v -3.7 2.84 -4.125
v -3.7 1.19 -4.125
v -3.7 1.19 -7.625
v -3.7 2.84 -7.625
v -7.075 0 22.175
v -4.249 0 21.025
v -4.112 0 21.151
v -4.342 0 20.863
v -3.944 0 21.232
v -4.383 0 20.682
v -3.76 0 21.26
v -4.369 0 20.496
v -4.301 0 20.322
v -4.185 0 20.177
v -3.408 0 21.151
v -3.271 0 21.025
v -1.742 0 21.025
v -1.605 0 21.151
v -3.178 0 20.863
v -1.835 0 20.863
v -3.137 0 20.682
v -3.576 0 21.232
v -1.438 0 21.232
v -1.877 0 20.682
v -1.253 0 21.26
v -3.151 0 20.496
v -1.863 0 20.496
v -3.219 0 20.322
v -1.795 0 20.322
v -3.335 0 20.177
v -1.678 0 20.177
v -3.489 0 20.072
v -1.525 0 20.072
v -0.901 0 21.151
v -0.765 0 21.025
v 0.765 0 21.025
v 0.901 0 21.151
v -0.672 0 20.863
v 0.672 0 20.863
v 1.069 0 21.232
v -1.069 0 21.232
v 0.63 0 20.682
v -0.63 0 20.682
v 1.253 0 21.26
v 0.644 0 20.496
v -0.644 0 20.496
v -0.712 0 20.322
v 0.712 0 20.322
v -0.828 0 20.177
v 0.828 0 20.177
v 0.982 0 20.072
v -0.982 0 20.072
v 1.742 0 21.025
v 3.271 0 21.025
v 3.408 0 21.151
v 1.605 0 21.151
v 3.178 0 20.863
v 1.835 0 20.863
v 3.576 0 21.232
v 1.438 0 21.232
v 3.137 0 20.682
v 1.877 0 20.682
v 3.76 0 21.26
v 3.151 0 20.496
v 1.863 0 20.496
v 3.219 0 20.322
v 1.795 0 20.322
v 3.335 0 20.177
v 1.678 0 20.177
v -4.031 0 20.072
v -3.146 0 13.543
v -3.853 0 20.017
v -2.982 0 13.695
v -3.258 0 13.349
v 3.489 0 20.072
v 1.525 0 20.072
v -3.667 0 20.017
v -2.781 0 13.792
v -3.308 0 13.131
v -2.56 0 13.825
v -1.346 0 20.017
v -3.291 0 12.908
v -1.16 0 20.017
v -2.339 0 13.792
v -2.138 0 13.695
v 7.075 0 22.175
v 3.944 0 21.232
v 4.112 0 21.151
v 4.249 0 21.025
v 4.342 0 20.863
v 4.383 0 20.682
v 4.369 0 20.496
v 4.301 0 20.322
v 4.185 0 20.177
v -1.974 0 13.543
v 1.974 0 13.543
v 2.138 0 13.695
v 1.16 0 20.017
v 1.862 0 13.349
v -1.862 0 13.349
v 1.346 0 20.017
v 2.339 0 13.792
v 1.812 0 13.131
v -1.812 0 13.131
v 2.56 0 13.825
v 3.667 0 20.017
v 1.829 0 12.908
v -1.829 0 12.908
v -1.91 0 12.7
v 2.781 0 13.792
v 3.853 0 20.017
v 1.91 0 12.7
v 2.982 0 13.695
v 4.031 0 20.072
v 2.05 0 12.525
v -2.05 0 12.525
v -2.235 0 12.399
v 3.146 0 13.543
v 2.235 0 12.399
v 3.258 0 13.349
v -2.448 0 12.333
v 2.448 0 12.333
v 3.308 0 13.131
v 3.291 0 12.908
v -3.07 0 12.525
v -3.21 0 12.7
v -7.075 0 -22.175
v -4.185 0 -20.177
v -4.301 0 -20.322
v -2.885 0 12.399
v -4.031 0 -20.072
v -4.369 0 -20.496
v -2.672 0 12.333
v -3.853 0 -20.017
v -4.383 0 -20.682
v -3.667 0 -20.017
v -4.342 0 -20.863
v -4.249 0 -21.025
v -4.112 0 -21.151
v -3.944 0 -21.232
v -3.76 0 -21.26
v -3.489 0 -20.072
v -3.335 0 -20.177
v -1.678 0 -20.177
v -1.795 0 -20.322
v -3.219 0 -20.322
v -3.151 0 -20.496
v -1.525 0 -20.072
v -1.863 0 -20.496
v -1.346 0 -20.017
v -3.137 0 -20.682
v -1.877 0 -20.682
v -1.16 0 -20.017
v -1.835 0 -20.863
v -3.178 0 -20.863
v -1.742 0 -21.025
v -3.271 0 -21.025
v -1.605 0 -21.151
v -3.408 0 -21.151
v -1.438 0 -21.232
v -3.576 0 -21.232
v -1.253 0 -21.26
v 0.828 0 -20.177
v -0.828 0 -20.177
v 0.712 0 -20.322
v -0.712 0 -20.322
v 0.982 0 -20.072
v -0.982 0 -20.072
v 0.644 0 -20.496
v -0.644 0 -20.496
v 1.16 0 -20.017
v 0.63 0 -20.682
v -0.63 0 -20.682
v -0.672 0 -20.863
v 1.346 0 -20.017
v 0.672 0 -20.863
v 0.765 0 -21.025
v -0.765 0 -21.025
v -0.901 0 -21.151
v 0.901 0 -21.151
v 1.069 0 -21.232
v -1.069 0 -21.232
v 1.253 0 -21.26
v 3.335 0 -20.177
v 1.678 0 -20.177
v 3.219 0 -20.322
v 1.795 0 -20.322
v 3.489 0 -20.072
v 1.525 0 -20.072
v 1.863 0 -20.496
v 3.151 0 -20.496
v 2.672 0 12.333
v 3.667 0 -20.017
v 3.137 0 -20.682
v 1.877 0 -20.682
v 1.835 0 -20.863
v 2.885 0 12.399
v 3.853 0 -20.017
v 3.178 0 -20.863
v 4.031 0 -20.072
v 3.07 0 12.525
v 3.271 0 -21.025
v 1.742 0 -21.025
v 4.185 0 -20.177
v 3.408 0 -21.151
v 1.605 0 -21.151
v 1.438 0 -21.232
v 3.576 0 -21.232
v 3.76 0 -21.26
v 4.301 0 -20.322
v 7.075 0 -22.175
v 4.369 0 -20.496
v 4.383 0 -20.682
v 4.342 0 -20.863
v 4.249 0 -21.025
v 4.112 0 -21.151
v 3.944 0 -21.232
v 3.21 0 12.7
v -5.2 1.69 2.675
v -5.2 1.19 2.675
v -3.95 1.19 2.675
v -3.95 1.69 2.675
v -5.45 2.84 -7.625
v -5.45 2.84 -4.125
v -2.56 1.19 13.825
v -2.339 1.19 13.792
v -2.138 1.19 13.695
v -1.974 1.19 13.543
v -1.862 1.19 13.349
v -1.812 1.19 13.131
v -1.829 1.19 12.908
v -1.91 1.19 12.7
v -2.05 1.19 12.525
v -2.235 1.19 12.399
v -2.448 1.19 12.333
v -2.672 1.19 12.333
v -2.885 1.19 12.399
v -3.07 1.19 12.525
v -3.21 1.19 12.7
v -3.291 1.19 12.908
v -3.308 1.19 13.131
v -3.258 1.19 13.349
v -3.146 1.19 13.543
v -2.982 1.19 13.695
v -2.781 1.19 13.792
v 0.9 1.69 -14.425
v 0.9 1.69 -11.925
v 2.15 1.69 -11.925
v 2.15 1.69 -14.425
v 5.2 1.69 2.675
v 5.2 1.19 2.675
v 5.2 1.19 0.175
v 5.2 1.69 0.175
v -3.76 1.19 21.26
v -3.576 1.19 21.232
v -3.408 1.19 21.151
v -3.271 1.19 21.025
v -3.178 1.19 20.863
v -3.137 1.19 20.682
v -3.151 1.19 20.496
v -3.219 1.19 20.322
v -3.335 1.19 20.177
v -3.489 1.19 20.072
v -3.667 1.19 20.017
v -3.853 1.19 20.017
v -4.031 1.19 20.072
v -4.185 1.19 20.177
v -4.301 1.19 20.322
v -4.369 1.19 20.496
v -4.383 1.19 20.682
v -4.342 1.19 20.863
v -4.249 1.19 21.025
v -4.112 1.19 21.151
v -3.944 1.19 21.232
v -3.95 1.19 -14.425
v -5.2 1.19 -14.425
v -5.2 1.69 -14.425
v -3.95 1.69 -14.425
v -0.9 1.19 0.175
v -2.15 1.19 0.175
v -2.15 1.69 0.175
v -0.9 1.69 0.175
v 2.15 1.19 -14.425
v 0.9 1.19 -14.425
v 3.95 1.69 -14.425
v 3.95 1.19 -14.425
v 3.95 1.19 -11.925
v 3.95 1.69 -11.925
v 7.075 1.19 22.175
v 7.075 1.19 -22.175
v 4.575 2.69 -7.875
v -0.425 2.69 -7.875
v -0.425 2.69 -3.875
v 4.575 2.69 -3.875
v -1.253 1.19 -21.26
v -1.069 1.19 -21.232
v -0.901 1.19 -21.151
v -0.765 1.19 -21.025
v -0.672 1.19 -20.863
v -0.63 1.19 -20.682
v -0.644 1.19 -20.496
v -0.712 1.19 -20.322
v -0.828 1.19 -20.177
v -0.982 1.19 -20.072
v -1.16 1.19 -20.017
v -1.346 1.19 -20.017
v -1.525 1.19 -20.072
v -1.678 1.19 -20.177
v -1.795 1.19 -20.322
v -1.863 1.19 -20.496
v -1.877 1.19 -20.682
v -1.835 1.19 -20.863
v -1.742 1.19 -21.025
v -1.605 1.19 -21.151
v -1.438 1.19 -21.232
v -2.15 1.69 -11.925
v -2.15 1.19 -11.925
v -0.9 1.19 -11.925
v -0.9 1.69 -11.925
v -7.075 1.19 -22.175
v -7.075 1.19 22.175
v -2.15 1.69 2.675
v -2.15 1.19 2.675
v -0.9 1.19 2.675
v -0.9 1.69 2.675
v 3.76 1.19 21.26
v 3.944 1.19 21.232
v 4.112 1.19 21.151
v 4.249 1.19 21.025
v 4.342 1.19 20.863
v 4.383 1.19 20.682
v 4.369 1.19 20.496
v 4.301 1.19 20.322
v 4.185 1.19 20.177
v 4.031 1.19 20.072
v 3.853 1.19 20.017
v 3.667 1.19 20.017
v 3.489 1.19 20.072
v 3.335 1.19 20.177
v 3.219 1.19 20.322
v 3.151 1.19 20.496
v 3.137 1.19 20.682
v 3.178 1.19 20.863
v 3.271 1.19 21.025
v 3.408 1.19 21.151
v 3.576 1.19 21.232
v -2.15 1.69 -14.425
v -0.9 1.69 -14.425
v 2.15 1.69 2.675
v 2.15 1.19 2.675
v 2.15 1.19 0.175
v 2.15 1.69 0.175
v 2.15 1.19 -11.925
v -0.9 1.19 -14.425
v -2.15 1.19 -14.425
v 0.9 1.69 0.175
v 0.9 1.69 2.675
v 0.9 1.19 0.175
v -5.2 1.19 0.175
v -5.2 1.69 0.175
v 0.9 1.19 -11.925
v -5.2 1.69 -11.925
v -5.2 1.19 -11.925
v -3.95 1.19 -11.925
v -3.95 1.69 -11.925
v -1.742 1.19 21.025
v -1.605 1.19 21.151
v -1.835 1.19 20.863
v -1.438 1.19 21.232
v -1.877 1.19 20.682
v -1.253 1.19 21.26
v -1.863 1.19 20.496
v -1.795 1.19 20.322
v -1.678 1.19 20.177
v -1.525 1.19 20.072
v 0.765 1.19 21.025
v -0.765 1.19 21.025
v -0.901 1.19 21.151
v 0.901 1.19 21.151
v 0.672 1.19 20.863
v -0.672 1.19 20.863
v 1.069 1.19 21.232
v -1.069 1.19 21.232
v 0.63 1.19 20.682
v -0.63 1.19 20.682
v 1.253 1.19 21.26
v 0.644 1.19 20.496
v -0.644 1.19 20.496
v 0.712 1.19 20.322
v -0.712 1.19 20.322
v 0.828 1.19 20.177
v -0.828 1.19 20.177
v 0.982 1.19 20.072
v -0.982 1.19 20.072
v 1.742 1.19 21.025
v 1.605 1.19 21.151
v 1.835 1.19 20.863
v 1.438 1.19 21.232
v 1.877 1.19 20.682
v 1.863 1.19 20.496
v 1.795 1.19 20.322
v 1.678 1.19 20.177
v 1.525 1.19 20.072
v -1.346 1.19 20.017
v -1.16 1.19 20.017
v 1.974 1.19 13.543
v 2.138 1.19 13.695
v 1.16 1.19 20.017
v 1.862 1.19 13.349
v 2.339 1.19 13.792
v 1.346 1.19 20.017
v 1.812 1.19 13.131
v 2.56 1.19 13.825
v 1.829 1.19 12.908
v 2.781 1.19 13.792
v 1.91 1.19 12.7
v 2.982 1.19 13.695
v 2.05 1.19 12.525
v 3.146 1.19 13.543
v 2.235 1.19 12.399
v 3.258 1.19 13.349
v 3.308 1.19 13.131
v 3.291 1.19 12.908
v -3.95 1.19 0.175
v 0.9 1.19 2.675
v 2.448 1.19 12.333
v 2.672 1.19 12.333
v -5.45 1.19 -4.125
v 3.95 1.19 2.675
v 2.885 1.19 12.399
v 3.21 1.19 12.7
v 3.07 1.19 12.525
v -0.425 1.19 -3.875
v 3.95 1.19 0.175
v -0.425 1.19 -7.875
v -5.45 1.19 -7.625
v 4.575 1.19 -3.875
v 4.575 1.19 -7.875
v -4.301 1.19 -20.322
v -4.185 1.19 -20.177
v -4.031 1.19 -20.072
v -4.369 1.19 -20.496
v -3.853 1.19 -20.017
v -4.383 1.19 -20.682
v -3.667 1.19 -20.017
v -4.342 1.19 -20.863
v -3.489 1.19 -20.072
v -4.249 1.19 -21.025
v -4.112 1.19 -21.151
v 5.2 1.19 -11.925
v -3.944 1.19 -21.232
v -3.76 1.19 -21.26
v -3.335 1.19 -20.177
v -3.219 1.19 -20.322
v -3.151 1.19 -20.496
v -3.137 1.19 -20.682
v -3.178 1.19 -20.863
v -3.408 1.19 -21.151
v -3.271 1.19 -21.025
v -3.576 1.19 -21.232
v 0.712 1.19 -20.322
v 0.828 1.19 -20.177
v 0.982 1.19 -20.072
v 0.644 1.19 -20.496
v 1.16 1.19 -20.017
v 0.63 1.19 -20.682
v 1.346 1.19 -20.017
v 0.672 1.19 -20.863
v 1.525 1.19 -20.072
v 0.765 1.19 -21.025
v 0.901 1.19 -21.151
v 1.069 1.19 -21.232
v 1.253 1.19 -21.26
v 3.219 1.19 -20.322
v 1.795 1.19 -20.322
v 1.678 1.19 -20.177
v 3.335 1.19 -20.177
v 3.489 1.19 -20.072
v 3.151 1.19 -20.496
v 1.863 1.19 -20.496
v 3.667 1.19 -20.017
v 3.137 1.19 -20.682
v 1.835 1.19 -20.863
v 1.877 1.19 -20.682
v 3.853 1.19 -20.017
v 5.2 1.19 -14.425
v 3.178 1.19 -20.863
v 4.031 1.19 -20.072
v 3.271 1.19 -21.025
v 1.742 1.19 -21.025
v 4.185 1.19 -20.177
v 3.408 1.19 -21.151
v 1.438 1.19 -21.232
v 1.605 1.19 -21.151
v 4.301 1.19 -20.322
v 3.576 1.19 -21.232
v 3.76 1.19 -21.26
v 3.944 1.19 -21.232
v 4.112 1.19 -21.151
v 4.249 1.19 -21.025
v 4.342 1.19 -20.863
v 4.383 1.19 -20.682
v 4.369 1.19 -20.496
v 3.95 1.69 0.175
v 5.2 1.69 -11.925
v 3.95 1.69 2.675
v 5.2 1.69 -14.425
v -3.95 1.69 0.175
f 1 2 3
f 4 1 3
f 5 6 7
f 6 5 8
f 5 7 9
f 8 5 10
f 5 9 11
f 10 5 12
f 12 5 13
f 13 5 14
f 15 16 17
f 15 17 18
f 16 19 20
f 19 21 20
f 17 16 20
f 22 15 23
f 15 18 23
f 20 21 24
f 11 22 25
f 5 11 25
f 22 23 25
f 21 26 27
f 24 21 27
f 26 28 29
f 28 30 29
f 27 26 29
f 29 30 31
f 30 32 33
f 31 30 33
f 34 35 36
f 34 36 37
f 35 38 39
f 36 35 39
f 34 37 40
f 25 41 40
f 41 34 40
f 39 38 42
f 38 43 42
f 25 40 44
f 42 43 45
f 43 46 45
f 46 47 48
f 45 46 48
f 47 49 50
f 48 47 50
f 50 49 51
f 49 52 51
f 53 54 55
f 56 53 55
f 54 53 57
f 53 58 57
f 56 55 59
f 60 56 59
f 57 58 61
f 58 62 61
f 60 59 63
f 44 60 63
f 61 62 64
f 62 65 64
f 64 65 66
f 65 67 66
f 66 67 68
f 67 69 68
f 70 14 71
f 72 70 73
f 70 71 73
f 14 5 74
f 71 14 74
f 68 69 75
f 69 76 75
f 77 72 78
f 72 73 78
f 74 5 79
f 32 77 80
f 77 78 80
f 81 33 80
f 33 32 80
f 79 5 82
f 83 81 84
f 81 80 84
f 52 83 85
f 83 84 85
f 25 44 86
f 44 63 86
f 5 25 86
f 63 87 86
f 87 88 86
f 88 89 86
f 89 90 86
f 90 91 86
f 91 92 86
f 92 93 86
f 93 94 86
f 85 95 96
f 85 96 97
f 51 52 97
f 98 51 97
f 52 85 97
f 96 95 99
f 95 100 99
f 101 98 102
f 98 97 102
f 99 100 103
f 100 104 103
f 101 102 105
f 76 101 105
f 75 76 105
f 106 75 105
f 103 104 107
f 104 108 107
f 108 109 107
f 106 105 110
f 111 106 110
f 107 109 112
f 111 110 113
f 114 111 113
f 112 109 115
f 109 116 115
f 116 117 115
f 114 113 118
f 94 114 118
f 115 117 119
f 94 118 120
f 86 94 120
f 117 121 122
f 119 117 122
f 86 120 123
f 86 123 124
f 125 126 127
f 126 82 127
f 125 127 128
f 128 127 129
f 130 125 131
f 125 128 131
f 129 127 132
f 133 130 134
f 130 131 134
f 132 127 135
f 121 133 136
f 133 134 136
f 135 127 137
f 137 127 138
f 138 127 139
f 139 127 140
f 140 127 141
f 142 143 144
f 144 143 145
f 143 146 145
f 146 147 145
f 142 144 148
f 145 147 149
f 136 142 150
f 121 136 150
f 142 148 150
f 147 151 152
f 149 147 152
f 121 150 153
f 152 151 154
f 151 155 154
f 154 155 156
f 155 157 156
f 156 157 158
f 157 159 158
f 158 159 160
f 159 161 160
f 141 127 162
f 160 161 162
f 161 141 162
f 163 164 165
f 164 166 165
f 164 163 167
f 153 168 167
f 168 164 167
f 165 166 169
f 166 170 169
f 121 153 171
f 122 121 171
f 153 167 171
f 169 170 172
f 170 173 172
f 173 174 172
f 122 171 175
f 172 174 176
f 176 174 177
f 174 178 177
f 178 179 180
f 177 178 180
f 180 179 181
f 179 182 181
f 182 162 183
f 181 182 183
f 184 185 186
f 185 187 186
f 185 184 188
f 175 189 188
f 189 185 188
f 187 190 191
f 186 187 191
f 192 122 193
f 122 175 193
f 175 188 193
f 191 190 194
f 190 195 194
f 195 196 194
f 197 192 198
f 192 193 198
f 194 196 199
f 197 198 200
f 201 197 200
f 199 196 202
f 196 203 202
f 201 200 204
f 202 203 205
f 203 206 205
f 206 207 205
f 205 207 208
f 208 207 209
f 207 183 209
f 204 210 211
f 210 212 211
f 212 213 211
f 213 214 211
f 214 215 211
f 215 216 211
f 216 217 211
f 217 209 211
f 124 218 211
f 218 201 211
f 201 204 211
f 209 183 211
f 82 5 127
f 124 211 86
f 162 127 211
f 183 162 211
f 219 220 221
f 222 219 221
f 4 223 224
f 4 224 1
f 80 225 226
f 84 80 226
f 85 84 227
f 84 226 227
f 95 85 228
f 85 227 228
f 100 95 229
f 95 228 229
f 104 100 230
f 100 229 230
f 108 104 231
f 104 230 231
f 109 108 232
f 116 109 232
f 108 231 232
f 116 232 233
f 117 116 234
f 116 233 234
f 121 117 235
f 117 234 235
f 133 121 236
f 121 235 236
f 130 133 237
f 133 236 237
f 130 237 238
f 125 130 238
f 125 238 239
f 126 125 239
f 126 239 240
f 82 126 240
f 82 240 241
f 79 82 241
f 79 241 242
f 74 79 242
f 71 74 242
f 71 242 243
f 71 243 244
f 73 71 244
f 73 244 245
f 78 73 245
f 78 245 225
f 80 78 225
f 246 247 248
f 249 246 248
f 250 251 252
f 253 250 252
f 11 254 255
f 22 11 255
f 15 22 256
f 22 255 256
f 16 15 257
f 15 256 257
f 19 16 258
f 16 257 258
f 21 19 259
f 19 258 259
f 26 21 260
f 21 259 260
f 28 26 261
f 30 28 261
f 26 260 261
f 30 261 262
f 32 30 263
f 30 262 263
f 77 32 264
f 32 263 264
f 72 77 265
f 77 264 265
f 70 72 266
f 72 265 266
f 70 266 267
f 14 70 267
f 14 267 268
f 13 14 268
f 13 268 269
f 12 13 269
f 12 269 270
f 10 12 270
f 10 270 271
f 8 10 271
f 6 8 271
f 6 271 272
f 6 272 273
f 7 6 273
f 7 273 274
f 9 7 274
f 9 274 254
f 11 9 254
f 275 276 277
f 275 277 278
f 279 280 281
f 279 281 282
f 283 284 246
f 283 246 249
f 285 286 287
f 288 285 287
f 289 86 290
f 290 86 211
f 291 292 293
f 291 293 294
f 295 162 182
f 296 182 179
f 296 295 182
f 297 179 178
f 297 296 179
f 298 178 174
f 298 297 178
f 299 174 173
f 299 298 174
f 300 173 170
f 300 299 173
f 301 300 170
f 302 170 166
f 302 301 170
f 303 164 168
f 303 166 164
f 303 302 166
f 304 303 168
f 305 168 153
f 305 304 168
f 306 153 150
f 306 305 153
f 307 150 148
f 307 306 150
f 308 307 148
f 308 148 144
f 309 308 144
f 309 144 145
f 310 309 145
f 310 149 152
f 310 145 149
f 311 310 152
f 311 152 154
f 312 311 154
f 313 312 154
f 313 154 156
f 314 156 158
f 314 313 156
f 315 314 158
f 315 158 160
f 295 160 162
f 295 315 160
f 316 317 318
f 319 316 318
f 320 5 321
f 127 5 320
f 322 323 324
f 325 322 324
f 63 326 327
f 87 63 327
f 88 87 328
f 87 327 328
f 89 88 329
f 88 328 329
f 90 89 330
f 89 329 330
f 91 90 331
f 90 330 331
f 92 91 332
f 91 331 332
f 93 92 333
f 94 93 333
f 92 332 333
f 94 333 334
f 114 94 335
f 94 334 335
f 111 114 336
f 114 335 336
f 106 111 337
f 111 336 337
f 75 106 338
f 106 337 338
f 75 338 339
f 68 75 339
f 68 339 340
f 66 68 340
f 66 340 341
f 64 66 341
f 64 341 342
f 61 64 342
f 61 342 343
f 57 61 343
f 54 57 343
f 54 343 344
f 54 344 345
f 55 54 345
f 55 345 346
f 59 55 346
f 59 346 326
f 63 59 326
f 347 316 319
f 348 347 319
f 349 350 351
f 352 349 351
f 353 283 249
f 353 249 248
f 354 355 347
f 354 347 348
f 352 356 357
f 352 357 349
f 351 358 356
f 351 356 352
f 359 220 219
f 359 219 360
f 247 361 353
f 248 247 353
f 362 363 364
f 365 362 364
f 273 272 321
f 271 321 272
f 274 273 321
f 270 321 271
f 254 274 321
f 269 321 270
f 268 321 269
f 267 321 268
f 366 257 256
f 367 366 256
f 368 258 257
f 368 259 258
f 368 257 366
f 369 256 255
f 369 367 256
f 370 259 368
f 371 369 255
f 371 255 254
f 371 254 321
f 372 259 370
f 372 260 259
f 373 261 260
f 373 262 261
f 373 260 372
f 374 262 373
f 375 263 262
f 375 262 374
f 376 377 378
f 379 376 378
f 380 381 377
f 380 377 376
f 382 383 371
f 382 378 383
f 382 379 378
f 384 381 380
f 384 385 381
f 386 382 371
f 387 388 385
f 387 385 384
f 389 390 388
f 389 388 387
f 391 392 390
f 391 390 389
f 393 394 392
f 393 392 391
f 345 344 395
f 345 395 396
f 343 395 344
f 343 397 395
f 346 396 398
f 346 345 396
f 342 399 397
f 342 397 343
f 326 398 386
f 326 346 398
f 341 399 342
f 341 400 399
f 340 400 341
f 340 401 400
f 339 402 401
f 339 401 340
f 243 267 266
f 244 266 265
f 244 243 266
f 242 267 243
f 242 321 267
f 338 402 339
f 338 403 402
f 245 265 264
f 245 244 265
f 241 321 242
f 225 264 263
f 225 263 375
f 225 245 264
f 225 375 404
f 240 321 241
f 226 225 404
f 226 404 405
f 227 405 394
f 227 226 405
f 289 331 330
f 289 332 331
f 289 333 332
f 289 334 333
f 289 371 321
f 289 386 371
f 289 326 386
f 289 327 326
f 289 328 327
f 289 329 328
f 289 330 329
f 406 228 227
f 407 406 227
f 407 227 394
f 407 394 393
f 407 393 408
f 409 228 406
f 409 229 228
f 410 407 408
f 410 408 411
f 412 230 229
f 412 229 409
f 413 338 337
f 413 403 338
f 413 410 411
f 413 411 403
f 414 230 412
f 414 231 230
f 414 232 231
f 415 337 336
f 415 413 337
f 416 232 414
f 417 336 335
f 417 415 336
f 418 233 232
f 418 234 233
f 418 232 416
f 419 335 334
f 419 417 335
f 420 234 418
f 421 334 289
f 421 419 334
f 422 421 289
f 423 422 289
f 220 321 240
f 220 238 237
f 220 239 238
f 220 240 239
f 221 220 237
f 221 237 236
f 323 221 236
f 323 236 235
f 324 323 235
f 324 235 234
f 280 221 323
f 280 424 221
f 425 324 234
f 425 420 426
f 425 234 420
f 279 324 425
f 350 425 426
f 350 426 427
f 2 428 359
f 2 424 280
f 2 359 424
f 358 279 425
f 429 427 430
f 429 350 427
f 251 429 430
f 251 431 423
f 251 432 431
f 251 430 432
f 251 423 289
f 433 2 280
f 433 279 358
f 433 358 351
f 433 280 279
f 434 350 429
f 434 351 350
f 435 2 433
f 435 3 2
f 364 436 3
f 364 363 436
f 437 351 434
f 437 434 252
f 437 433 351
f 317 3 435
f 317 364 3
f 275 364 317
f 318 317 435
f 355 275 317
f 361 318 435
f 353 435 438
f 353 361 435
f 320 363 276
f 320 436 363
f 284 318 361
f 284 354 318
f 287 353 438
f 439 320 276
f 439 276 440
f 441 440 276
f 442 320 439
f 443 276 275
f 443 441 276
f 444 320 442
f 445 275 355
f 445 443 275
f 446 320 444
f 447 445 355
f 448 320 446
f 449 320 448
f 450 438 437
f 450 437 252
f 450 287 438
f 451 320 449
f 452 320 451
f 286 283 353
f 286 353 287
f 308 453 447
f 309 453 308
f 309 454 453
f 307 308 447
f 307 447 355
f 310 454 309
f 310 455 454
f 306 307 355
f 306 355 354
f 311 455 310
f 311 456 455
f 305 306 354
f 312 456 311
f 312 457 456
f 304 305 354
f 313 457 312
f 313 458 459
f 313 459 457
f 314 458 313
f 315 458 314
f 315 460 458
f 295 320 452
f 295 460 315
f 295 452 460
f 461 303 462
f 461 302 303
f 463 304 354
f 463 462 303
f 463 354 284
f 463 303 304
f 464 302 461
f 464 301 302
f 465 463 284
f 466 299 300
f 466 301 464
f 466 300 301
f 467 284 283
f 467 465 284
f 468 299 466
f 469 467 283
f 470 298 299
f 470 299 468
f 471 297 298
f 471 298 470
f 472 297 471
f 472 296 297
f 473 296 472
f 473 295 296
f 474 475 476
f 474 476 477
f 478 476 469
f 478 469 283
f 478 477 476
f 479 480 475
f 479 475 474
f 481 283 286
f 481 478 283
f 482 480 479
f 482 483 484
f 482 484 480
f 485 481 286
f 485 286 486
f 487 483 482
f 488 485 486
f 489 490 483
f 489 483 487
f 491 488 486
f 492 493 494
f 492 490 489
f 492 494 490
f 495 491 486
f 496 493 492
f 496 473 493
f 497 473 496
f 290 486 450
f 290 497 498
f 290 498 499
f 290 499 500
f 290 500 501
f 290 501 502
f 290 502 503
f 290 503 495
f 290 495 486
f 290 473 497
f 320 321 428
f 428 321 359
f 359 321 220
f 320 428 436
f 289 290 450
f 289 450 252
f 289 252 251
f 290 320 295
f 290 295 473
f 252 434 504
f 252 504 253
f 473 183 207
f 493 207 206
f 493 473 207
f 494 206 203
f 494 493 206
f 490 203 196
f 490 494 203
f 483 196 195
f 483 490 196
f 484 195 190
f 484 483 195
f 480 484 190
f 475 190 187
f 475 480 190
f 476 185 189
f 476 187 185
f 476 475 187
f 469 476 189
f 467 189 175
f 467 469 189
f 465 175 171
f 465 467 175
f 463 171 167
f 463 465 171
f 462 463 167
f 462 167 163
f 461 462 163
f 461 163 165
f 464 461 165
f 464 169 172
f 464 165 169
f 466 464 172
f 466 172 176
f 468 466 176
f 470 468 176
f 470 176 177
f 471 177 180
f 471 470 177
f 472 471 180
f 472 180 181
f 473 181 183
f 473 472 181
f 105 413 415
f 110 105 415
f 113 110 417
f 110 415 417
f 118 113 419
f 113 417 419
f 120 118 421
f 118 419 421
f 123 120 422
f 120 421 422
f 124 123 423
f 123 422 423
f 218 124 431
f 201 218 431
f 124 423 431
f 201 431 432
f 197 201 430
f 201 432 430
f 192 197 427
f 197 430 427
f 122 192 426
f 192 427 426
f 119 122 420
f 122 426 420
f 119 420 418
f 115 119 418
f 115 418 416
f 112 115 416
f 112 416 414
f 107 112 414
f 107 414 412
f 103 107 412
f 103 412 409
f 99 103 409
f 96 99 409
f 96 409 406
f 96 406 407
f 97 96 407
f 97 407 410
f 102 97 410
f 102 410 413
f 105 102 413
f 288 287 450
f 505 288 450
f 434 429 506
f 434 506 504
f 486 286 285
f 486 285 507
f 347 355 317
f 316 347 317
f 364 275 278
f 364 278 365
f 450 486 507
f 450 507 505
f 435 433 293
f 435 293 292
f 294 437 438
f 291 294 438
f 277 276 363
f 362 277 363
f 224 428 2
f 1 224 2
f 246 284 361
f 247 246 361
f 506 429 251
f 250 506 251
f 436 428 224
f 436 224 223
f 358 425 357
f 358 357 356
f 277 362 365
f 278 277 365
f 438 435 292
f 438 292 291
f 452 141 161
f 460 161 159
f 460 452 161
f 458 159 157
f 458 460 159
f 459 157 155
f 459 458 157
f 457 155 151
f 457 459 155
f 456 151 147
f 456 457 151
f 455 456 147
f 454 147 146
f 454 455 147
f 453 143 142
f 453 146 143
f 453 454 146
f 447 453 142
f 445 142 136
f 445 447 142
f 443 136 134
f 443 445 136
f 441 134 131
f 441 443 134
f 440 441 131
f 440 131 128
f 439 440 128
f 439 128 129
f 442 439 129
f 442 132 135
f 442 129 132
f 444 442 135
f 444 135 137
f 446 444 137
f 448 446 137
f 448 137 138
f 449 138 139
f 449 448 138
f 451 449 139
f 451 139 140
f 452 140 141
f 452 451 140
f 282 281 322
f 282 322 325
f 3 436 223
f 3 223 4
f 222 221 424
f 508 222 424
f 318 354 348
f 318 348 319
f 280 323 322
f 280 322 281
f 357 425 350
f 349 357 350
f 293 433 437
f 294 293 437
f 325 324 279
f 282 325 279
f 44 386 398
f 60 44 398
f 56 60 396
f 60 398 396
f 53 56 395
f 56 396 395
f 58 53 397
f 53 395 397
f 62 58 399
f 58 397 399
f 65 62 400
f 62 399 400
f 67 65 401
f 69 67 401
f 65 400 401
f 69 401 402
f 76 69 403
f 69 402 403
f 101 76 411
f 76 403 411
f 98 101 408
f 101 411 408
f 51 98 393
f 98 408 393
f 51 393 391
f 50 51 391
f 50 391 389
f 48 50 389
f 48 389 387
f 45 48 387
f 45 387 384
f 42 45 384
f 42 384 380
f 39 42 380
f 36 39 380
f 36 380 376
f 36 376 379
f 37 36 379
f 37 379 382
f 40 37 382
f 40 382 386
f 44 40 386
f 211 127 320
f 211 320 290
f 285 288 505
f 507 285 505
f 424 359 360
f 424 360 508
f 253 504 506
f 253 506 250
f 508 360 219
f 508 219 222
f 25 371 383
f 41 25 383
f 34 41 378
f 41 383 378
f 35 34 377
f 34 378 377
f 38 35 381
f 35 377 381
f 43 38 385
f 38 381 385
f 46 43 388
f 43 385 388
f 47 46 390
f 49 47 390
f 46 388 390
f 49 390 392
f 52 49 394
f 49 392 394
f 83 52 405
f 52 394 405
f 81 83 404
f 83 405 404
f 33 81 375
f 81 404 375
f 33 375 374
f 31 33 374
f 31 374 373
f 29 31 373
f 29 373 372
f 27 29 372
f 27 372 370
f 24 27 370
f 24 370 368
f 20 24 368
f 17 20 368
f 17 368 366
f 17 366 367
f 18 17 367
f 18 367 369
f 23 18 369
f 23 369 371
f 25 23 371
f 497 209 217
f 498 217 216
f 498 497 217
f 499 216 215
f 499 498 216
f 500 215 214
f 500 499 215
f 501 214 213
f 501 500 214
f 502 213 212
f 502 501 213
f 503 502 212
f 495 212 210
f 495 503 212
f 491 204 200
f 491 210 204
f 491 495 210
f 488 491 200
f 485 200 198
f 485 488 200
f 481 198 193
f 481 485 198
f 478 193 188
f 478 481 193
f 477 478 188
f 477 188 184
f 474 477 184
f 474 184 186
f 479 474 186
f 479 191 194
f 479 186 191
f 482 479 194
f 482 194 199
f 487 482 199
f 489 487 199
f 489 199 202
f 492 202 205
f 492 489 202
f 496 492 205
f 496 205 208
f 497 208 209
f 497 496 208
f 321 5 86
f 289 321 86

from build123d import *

# Parameters (mm, degrees)
SKETCH1_W           = 14.15
SKETCH1_H           = 44.35
BOSS_EXTRUDE1_DEPTH = 1.19
SKETCH2_R           = 0.625
CUT_EXTRUDE1_DEPTH  = 24.306701826
SKETCH3_R           = 0.75
CUT_EXTRUDE2_DEPTH  = 24.306701826
SKETCH4_W           = 5
SKETCH4_H           = 4
BOSS_EXTRUDE2_DEPTH = 1.5
SKETCH4_3_W         = 1.75
SKETCH4_3_H         = 3.5
BOSS_EXTRUDE3_DEPTH = 1.65
SKETCH7_W           = 1.25
SKETCH7_H           = 2.5
BOSS_EXTRUDE6_DEPTH = 0.5


with BuildPart() as part:
    # Sketch1 → Boss-Extrude1 (new body)
    with BuildSketch(Plane(origin=(0, 0, 0), x_dir=(1, 0, 0), z_dir=(0, 1, 0))):
        Rectangle(SKETCH1_W, SKETCH1_H)
    extrude(amount=BOSS_EXTRUDE1_DEPTH)

    # Sketch2 → Cut-Extrude1 (cut, through all)
    with BuildSketch(Plane(origin=(0, 1.19, 0), x_dir=(1, 0, 0), z_dir=(0, 1, 0))):
        with Locations((3.76, -20.635)):
            Circle(SKETCH2_R)
        with Locations((1.253333333, -20.635)):
            Circle(SKETCH2_R)
        with Locations((-1.253333333, -20.635)):
            Circle(SKETCH2_R)
        with Locations((-3.76, -20.635)):
            Circle(SKETCH2_R)
    cut_extrude1 = extrude(amount=-CUT_EXTRUDE1_DEPTH, mode=Mode.SUBTRACT)

    # Mirror1: Cut-Extrude1 across plane
    add(cut_extrude1.mirror(Plane.XY), mode=Mode.SUBTRACT)

    # Sketch3 → Cut-Extrude2 (cut, through all)
    with BuildSketch(Plane(origin=(0, 1.19, 0), x_dir=(1, 0, 0), z_dir=(0, 1, 0))):
        with Locations((2.56, -13.075)):
            Circle(SKETCH3_R)
        with Locations((-2.56, -13.075)):
            Circle(SKETCH3_R)
    extrude(amount=-CUT_EXTRUDE2_DEPTH, mode=Mode.SUBTRACT)

    # Sketch4 → Boss-Extrude2 (add)
    with BuildSketch(Plane(origin=(0, 1.19, 0), x_dir=(1, 0, 0), z_dir=(0, 1, 0))):
        with Locations((2.075, 5.875)):
            Rectangle(SKETCH4_W, SKETCH4_H)
    extrude(amount=BOSS_EXTRUDE2_DEPTH)

    # Sketch4<3> → Boss-Extrude3 (add)
    with BuildSketch(Plane(origin=(0, 1.19, 0), x_dir=(1, 0, 0), z_dir=(0, 1, 0))):
        with Locations((-4.575, 5.875)):
            Rectangle(SKETCH4_3_W, SKETCH4_3_H)
    extrude(amount=BOSS_EXTRUDE3_DEPTH)

    # Sketch7 → Boss-Extrude6 (add)
    with BuildSketch(Plane(origin=(0, 1.19, 0), x_dir=(1, 0, 0), z_dir=(0, 1, 0))):
        with Locations((-4.575, -1.425)):
            Rectangle(SKETCH7_W, SKETCH7_H)
        with Locations((-1.525, -1.425)):
            Rectangle(SKETCH7_W, SKETCH7_H)
        with Locations((1.525, -1.425)):
            Rectangle(SKETCH7_W, SKETCH7_H)
        with Locations((4.575, -1.425)):
            Rectangle(SKETCH7_W, SKETCH7_H)
    boss_extrude6 = extrude(amount=BOSS_EXTRUDE6_DEPTH)

    # Mirror2: Boss-Extrude6 across plane
    add(boss_extrude6.mirror(Plane.XY.offset(-5.875)))


solid = part.part
